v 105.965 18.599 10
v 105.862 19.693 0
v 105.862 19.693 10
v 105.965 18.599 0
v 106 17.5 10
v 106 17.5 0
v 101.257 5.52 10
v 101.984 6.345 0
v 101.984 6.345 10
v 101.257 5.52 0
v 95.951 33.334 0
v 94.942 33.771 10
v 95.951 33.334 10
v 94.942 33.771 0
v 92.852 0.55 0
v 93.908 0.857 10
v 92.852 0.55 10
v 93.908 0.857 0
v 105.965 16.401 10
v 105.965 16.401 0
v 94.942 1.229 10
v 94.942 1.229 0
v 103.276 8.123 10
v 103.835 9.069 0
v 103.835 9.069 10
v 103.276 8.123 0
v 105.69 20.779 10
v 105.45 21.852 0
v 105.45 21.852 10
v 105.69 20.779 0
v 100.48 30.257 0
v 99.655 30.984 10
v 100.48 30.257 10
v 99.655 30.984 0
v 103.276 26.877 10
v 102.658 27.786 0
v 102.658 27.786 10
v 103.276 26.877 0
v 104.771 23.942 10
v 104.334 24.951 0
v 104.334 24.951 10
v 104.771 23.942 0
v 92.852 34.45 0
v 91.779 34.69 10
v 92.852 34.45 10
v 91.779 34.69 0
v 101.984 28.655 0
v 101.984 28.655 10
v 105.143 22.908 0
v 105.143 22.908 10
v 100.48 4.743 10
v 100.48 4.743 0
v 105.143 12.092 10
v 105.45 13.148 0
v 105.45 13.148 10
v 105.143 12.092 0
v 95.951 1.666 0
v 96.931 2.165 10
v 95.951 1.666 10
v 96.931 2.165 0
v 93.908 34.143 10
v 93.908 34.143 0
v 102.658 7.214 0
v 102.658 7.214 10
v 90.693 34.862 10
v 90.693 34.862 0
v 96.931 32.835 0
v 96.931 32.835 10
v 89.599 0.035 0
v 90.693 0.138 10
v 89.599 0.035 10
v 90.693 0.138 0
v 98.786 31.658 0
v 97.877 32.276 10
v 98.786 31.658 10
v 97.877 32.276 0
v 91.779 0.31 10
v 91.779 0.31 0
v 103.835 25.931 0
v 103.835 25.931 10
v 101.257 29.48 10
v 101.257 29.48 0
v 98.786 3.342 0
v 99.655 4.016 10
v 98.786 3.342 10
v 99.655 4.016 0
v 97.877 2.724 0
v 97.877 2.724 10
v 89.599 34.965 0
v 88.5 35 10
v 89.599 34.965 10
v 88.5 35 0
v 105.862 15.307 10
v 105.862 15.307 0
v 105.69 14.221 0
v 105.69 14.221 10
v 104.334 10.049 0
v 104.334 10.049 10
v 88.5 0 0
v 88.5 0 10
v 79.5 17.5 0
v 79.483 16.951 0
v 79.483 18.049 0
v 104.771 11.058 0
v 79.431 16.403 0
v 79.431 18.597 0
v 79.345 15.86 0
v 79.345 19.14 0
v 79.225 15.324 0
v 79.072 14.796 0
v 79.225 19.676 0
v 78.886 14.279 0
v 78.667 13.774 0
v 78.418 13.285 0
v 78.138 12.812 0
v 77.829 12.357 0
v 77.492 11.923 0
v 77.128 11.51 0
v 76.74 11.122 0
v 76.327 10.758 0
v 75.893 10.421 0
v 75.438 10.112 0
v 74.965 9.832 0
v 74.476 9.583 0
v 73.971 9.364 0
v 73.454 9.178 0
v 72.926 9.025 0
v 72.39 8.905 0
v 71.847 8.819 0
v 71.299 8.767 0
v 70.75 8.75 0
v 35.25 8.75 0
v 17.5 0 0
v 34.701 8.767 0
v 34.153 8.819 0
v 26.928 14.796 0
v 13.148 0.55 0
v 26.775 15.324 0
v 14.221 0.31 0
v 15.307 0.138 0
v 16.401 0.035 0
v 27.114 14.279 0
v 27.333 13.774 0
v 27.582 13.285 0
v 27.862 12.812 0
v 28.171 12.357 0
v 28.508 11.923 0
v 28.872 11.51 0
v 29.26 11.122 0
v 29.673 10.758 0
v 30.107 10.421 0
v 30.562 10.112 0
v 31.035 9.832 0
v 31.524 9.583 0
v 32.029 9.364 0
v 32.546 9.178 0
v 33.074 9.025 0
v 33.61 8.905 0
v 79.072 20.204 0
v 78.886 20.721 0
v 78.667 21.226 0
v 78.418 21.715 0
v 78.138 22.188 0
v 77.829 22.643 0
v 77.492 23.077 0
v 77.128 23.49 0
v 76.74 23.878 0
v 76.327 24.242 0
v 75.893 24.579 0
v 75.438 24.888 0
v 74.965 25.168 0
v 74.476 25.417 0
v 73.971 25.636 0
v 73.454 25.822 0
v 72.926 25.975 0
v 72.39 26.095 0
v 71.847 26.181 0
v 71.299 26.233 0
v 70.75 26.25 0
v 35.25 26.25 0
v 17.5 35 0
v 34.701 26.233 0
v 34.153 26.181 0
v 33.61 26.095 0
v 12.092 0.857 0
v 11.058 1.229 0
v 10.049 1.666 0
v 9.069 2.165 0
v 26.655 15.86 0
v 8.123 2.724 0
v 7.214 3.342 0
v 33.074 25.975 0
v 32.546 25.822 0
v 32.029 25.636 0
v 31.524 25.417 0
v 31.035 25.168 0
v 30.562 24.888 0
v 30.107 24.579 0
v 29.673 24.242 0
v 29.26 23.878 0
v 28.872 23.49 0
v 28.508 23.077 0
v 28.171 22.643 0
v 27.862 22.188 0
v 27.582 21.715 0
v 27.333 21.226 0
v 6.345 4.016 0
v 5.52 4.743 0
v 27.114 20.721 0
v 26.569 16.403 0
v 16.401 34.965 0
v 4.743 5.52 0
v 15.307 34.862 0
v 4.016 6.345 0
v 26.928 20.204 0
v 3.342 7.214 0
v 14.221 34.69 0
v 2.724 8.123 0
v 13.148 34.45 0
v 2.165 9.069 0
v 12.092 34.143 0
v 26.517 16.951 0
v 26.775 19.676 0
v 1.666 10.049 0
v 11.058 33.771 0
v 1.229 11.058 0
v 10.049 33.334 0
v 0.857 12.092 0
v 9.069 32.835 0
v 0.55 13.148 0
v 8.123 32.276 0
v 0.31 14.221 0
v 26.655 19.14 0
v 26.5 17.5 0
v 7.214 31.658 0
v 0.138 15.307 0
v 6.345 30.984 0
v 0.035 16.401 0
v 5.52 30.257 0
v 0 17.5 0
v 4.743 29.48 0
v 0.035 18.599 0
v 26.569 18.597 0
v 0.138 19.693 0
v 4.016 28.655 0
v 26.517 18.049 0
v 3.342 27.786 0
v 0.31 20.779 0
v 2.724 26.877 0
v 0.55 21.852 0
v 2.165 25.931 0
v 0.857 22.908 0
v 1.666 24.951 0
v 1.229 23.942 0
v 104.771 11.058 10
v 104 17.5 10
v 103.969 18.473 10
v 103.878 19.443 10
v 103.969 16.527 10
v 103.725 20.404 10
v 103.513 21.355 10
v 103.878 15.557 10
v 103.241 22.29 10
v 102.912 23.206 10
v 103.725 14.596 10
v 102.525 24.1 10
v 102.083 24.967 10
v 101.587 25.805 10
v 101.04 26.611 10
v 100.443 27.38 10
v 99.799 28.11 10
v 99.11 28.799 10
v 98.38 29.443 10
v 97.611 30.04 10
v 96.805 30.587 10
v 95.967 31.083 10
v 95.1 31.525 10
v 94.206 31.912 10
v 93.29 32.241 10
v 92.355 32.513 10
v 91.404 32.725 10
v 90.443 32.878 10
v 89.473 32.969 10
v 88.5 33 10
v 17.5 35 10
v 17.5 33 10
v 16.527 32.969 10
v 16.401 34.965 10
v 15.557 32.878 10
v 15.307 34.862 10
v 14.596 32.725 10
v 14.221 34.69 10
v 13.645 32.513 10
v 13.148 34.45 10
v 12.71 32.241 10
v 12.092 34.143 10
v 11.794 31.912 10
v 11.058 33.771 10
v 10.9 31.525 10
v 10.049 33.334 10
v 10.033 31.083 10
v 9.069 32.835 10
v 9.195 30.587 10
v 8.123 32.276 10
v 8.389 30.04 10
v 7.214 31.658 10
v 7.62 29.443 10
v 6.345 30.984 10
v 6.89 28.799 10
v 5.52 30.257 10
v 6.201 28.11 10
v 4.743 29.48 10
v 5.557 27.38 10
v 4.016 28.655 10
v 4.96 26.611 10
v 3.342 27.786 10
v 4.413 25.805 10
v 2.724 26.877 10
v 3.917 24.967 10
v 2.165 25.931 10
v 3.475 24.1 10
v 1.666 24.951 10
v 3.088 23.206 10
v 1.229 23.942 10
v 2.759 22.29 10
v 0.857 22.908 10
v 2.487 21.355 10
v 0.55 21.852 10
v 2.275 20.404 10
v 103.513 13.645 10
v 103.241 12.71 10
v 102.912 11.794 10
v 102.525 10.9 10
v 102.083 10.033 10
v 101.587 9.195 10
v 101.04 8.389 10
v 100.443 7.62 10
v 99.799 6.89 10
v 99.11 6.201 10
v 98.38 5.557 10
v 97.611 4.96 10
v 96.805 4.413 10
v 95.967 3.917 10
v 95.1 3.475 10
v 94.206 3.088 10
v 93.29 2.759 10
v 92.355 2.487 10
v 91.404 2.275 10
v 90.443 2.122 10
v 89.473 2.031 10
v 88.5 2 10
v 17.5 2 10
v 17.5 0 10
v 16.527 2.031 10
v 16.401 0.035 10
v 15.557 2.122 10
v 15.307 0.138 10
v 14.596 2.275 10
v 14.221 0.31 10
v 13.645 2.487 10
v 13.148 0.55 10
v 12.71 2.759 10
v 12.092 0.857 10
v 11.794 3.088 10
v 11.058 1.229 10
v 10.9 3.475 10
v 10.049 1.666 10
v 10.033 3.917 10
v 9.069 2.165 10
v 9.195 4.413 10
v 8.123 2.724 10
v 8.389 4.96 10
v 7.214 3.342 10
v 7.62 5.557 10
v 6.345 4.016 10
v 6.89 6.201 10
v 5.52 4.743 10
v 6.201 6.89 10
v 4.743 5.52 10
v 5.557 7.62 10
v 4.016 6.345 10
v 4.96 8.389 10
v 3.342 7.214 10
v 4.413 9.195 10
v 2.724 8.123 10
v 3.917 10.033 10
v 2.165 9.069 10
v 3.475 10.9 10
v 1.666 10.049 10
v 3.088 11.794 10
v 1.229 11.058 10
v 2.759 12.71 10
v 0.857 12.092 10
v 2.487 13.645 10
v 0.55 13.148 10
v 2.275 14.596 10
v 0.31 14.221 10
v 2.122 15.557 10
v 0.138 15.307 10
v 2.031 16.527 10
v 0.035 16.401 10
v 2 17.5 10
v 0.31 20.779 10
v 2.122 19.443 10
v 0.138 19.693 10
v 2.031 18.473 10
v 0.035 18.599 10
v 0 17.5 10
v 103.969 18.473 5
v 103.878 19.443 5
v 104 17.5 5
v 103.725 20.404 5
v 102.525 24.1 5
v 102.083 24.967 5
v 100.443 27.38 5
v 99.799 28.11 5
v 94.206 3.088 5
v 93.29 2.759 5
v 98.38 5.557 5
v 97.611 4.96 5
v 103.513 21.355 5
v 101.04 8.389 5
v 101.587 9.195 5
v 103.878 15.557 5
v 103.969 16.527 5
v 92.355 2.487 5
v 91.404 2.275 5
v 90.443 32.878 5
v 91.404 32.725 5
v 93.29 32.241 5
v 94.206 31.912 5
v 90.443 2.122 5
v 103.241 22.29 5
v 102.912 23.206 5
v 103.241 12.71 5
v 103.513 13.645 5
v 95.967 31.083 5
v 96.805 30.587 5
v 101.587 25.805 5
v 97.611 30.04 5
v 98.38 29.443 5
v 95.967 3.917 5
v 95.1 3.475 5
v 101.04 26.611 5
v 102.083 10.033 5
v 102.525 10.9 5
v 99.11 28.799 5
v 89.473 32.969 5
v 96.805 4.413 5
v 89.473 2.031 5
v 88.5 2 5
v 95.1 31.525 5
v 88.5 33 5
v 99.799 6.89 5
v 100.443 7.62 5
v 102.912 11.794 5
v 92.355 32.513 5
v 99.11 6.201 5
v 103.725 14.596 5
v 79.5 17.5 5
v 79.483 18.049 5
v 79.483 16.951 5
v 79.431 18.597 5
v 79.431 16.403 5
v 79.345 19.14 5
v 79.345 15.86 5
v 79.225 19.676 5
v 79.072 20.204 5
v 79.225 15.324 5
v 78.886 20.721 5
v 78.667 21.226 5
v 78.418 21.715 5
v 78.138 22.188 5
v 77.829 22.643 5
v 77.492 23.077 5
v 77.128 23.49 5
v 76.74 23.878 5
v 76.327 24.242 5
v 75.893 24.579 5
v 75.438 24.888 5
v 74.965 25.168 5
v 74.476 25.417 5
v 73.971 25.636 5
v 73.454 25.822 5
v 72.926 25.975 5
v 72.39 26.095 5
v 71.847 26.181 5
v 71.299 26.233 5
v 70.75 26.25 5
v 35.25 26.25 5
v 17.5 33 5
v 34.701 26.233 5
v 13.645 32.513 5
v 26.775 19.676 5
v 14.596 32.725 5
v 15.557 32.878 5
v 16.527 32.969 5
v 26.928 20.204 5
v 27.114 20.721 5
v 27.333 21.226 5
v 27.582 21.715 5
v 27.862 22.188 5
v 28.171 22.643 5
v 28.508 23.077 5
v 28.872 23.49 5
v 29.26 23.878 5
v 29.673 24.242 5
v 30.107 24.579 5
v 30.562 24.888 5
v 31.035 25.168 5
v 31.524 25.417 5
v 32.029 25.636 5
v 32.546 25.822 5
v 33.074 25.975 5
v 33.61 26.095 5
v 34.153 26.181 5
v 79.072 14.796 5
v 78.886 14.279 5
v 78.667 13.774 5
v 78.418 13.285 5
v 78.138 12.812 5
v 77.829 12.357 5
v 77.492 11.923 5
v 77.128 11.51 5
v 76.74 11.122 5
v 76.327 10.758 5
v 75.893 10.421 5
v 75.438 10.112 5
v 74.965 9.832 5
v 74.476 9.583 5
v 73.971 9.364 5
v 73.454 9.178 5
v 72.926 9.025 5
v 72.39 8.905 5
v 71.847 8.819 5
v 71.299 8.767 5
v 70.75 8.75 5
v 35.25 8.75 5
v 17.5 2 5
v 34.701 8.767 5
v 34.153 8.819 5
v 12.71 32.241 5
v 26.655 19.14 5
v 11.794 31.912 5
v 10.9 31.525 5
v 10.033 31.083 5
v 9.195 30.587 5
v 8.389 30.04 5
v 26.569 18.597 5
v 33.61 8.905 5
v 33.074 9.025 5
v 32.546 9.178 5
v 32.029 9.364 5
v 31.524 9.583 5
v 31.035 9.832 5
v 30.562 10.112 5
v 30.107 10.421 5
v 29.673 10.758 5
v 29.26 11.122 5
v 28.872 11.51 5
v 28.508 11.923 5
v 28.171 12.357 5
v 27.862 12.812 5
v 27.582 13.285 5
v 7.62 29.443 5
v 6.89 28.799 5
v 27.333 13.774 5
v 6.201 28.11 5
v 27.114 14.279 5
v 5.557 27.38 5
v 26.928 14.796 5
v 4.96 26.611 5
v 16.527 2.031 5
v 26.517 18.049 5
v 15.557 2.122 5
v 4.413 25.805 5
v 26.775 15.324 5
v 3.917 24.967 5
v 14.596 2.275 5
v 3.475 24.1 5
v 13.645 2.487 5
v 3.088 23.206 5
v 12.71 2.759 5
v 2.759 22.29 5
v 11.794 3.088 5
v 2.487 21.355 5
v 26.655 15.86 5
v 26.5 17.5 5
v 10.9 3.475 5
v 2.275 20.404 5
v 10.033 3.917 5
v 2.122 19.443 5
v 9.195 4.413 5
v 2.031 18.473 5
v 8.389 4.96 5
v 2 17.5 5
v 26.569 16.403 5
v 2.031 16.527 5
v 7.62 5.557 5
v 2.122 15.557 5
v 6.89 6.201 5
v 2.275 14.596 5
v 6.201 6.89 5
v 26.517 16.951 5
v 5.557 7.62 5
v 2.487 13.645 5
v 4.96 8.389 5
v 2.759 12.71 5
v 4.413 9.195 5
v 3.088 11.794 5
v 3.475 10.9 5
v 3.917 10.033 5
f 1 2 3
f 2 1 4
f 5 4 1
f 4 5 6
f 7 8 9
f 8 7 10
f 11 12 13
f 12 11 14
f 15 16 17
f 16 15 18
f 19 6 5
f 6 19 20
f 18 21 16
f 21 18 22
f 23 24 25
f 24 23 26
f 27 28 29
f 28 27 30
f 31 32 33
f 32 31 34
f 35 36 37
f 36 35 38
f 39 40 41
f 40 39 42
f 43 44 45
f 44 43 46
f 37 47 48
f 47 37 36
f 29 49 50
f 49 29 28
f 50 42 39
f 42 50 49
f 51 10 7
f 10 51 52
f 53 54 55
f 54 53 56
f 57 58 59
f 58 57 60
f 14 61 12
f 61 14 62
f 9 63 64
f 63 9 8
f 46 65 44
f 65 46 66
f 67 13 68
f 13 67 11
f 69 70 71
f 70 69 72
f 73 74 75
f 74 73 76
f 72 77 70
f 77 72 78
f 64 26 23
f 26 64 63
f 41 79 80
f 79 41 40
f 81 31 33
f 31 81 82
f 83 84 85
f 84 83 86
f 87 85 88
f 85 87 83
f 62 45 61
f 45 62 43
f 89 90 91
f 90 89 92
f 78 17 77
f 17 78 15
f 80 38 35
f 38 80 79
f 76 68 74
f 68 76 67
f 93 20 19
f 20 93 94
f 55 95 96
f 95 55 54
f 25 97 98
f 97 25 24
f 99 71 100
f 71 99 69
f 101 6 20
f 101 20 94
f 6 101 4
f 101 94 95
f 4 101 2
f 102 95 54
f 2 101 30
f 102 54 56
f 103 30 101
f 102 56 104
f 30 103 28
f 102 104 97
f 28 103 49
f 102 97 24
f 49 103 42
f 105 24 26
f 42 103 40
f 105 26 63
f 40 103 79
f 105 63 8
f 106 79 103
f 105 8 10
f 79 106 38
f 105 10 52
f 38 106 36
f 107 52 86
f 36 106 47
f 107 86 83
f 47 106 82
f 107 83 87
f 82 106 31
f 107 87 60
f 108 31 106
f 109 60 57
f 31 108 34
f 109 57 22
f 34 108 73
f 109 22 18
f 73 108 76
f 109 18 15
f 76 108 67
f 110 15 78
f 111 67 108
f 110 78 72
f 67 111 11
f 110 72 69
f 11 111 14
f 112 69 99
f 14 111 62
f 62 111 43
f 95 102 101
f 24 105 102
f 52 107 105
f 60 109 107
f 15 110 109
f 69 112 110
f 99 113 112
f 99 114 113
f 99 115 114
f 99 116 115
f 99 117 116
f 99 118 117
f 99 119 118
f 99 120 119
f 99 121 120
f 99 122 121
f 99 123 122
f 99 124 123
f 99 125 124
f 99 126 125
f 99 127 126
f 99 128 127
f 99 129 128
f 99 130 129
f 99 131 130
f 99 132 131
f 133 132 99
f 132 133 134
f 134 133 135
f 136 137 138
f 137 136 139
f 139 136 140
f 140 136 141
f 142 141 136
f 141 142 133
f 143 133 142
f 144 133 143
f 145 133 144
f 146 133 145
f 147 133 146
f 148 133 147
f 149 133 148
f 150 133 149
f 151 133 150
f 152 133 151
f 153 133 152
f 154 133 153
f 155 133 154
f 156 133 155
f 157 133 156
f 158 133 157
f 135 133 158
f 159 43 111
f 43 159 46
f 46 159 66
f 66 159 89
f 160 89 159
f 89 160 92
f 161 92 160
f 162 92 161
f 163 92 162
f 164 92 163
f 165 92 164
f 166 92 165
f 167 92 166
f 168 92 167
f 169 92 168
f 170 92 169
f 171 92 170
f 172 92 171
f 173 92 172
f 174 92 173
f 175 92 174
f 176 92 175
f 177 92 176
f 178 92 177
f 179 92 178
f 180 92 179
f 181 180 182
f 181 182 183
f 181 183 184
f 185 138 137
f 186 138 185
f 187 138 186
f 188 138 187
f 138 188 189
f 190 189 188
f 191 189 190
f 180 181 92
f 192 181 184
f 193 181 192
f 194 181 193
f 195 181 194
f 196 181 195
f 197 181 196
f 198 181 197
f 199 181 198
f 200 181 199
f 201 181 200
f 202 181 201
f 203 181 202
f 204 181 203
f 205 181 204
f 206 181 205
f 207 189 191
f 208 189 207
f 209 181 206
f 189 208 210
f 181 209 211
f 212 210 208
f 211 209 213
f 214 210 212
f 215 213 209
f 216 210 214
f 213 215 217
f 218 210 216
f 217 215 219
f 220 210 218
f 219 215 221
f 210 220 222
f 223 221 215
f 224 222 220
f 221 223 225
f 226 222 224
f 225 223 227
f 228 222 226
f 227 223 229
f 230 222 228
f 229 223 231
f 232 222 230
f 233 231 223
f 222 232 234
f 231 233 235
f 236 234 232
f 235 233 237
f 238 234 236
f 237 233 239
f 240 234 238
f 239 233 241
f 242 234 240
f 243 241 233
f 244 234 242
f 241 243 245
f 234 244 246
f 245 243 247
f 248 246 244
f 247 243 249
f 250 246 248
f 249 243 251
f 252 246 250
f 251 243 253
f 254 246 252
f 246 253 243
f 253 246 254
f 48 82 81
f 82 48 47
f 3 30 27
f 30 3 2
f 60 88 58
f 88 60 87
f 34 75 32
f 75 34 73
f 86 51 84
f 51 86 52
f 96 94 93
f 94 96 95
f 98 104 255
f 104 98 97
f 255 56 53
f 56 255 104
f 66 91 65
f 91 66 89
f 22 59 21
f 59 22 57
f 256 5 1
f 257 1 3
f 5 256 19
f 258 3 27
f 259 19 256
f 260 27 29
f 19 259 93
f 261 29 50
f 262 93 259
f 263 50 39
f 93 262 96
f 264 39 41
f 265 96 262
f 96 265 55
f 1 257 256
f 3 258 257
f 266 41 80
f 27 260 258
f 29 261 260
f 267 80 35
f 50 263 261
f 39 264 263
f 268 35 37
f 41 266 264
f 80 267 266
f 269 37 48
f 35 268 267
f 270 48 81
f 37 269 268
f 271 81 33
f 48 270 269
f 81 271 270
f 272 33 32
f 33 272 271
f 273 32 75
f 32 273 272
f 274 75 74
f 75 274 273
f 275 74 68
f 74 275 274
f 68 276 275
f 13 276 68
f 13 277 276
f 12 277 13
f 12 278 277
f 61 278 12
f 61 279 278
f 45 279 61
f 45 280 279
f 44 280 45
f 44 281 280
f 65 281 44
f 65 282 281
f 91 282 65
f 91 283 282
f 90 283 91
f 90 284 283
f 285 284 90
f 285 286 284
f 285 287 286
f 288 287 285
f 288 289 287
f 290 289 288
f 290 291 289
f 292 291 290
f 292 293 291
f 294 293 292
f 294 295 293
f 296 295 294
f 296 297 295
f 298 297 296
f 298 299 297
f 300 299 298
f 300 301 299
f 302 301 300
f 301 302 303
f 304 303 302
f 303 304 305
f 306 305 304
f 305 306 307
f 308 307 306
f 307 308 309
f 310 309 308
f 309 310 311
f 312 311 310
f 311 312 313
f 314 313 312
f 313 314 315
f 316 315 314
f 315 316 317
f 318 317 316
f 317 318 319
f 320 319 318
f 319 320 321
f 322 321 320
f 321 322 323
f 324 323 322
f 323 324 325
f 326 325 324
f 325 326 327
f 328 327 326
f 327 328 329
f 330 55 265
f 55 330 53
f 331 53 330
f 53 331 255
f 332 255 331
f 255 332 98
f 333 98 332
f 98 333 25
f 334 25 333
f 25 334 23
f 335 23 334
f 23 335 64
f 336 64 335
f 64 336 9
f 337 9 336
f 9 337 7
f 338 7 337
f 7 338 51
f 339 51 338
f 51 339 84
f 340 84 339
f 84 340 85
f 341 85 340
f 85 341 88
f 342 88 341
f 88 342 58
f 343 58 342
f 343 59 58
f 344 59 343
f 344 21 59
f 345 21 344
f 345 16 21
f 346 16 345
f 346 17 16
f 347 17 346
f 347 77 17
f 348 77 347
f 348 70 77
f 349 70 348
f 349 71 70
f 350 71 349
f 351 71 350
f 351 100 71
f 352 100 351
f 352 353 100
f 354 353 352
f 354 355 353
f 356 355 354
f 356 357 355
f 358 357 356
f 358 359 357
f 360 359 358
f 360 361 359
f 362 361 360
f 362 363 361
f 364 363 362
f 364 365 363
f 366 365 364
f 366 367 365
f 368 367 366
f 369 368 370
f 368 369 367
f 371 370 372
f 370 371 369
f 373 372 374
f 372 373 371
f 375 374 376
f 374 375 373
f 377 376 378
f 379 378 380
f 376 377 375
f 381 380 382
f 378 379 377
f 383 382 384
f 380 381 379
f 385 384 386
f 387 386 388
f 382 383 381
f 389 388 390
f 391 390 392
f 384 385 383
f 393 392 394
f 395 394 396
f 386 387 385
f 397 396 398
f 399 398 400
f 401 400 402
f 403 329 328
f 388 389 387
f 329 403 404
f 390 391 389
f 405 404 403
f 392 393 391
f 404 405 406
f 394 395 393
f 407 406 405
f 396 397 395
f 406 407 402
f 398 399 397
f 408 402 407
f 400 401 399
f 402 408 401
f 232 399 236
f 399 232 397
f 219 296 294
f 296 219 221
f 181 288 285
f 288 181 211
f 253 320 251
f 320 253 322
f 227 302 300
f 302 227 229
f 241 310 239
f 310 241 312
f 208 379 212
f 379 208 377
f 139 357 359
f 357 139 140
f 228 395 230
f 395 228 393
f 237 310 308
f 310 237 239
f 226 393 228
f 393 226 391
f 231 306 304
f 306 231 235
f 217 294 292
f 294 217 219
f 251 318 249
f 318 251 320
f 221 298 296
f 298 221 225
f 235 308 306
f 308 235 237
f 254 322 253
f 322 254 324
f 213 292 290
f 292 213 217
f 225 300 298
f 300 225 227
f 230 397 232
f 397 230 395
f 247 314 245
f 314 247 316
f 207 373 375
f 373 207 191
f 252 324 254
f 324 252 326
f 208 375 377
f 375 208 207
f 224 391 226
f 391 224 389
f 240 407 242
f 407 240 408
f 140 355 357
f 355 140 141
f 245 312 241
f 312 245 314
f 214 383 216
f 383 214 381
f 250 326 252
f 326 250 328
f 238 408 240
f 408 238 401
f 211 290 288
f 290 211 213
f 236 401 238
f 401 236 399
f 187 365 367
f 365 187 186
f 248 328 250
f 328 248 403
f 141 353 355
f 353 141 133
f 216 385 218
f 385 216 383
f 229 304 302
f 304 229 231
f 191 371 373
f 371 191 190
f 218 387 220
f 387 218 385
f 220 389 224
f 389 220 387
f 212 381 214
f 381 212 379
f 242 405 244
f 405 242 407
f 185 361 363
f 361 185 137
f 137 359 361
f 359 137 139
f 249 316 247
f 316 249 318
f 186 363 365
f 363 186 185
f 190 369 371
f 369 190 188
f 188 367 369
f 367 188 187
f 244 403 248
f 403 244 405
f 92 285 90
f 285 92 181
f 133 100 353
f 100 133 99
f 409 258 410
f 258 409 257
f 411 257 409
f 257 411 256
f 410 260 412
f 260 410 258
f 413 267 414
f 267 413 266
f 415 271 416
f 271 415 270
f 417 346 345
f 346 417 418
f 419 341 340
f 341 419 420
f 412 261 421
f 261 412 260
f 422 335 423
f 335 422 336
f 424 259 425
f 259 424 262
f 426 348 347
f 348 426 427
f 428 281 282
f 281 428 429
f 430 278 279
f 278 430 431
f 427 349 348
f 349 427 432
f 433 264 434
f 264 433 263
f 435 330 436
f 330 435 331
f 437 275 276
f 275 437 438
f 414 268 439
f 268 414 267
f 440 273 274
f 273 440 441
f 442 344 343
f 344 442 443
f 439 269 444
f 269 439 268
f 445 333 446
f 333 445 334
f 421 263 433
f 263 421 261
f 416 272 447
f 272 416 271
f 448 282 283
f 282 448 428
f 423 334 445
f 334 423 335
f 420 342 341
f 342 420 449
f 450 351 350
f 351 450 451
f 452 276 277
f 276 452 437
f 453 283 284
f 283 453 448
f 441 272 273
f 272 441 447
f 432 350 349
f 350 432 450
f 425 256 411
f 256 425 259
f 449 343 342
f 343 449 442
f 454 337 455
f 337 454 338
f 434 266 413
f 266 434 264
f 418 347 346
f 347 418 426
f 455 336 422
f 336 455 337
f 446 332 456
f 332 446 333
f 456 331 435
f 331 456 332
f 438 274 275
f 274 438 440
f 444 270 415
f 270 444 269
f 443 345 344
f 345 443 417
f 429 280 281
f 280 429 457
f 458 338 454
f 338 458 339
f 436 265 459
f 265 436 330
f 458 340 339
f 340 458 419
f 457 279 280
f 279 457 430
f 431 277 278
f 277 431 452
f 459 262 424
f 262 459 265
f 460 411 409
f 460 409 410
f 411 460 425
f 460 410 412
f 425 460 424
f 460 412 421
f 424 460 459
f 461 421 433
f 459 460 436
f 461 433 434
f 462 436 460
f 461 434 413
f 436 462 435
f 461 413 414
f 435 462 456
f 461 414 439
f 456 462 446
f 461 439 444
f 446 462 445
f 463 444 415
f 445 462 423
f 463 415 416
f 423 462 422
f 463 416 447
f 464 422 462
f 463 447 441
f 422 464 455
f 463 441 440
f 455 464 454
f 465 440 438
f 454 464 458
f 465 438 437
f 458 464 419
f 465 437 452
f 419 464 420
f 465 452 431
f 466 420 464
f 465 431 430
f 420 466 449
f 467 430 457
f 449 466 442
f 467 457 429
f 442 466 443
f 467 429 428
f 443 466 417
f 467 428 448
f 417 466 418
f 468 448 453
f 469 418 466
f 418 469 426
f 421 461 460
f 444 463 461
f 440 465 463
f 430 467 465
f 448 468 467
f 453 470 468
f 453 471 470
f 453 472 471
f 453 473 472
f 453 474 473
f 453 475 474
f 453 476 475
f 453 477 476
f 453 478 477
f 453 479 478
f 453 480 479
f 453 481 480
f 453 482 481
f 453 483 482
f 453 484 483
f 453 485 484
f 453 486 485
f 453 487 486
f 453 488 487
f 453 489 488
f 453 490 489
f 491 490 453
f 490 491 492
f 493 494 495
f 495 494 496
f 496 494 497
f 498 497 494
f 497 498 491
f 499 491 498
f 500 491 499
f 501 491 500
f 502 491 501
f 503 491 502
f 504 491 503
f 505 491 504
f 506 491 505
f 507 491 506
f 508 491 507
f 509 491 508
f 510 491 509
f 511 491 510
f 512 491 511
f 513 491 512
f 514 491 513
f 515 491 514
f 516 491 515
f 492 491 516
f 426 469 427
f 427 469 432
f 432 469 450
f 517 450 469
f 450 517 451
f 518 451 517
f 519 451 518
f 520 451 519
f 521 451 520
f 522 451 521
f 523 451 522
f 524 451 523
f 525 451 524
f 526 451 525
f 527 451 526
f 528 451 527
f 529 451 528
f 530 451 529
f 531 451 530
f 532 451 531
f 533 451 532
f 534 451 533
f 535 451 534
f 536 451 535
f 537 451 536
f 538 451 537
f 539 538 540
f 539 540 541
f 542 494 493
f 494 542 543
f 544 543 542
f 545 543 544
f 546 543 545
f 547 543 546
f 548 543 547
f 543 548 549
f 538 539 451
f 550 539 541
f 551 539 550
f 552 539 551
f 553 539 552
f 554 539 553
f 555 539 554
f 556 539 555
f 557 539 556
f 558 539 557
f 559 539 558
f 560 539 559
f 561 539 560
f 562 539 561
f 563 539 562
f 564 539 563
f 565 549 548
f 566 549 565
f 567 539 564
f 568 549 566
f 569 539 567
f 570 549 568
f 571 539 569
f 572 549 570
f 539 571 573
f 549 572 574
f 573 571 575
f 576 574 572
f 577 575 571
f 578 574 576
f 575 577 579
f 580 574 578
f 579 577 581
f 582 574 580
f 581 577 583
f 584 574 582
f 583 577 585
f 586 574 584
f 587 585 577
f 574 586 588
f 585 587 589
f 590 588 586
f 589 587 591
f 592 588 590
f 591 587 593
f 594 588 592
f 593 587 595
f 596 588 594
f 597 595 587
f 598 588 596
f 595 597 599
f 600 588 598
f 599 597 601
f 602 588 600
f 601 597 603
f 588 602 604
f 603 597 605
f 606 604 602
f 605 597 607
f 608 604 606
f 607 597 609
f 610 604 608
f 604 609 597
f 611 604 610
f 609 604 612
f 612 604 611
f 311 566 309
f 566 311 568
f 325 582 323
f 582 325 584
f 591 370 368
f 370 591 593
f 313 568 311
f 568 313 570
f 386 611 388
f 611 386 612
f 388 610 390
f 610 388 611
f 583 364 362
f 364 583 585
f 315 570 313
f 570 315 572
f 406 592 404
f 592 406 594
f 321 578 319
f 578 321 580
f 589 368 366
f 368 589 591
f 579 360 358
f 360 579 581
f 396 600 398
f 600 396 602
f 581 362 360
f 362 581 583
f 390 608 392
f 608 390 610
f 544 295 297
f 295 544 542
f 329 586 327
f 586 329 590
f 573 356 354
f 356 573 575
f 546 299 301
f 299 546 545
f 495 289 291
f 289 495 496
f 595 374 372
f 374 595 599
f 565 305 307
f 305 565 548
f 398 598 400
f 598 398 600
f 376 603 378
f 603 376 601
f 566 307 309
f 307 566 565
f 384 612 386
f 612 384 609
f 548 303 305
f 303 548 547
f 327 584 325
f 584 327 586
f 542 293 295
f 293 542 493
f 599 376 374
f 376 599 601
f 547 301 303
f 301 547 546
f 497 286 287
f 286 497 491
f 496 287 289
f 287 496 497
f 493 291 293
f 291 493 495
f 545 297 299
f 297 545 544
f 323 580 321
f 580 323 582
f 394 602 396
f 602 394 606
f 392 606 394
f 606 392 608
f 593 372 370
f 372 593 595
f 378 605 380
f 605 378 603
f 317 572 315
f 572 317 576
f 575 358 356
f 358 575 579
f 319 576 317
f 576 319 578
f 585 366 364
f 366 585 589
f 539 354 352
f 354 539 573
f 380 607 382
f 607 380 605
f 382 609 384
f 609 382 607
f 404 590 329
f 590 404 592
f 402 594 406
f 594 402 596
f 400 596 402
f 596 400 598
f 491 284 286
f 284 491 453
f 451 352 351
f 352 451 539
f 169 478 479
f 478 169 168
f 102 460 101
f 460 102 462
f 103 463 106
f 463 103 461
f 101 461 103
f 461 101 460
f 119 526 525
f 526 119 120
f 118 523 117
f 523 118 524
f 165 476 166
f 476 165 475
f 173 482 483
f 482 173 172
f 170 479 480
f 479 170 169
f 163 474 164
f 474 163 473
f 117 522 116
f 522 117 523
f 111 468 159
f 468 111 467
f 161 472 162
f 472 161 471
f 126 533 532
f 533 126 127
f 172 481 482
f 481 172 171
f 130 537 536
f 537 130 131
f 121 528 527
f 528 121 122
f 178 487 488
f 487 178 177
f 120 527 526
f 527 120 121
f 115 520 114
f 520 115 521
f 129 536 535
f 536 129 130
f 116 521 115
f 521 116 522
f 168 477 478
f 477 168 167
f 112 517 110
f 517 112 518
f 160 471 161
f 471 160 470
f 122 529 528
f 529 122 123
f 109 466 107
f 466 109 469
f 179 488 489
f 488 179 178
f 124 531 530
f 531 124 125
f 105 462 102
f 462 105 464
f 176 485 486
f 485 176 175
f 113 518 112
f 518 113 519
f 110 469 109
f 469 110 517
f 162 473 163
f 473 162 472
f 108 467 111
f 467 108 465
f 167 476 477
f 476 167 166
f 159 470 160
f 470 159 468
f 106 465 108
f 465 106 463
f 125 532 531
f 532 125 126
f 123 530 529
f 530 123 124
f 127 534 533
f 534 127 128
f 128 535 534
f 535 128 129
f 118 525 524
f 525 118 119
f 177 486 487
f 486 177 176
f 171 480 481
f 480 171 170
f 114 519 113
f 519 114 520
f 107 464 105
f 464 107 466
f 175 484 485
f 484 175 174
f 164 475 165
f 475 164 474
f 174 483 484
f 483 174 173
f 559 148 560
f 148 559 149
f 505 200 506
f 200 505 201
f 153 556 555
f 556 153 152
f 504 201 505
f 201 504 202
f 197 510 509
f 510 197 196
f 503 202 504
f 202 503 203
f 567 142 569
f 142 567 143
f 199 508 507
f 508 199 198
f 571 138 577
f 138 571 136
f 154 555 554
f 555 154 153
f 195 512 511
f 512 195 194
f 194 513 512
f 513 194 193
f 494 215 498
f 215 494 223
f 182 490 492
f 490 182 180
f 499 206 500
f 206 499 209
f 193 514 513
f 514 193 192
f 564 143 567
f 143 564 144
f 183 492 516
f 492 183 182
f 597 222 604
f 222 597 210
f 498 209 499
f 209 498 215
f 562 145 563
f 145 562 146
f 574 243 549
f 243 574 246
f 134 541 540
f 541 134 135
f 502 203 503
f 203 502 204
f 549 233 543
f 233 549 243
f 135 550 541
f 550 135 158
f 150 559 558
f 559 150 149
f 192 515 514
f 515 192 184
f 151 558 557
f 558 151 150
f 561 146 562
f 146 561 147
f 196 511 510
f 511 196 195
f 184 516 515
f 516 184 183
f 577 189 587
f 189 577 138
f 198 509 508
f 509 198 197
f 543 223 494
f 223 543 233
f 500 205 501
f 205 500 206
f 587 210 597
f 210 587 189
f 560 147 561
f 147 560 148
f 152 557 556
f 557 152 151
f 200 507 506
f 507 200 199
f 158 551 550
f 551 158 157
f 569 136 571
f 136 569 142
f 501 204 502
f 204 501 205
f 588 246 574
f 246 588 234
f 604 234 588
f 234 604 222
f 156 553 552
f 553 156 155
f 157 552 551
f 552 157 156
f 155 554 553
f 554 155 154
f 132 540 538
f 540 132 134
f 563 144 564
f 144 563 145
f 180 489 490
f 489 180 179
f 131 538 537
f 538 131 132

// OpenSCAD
/*
3499 x 10200
*/

width = 106;
depth = 35;
height = 10;
wall = 2;
thickness=3;




function totalLength(w,d) = w+d;
function squareLength(tw,d) = tw - d;
function radius(d) = d/2;
function focus2(w,d)=w-radius(d);

module oval(w, d, h)
{
    translate([focus2(w,d), radius(d), 0])
    cylinder($fn=100, h, d=d, false);
    
    translate([radius(d), radius(d), 0])
    cylinder($fn=100, h, d=d, false);
    
    translate([radius(d), 0, 0])
    cube([squareLength(w, d), d, h], false);  
}

module ovalWall(w, d, h, wall)
{
    difference()
    {
    oval(w, d, h);
    translate([wall,wall,h/2])
        oval(w-(2*wall), d-(2*wall), h*wall);
    }
}

difference()
{
    ovalWall(width, depth, height, wall);
    translate([width/4, depth/4,-wall])
    oval(width/2, depth/2, 20);
    
//        ovalWall(102, 34.9, 3, 2);
//    translate([51/2, 17.5/2,-2])
//    oval(51, 17.5,20);
}
